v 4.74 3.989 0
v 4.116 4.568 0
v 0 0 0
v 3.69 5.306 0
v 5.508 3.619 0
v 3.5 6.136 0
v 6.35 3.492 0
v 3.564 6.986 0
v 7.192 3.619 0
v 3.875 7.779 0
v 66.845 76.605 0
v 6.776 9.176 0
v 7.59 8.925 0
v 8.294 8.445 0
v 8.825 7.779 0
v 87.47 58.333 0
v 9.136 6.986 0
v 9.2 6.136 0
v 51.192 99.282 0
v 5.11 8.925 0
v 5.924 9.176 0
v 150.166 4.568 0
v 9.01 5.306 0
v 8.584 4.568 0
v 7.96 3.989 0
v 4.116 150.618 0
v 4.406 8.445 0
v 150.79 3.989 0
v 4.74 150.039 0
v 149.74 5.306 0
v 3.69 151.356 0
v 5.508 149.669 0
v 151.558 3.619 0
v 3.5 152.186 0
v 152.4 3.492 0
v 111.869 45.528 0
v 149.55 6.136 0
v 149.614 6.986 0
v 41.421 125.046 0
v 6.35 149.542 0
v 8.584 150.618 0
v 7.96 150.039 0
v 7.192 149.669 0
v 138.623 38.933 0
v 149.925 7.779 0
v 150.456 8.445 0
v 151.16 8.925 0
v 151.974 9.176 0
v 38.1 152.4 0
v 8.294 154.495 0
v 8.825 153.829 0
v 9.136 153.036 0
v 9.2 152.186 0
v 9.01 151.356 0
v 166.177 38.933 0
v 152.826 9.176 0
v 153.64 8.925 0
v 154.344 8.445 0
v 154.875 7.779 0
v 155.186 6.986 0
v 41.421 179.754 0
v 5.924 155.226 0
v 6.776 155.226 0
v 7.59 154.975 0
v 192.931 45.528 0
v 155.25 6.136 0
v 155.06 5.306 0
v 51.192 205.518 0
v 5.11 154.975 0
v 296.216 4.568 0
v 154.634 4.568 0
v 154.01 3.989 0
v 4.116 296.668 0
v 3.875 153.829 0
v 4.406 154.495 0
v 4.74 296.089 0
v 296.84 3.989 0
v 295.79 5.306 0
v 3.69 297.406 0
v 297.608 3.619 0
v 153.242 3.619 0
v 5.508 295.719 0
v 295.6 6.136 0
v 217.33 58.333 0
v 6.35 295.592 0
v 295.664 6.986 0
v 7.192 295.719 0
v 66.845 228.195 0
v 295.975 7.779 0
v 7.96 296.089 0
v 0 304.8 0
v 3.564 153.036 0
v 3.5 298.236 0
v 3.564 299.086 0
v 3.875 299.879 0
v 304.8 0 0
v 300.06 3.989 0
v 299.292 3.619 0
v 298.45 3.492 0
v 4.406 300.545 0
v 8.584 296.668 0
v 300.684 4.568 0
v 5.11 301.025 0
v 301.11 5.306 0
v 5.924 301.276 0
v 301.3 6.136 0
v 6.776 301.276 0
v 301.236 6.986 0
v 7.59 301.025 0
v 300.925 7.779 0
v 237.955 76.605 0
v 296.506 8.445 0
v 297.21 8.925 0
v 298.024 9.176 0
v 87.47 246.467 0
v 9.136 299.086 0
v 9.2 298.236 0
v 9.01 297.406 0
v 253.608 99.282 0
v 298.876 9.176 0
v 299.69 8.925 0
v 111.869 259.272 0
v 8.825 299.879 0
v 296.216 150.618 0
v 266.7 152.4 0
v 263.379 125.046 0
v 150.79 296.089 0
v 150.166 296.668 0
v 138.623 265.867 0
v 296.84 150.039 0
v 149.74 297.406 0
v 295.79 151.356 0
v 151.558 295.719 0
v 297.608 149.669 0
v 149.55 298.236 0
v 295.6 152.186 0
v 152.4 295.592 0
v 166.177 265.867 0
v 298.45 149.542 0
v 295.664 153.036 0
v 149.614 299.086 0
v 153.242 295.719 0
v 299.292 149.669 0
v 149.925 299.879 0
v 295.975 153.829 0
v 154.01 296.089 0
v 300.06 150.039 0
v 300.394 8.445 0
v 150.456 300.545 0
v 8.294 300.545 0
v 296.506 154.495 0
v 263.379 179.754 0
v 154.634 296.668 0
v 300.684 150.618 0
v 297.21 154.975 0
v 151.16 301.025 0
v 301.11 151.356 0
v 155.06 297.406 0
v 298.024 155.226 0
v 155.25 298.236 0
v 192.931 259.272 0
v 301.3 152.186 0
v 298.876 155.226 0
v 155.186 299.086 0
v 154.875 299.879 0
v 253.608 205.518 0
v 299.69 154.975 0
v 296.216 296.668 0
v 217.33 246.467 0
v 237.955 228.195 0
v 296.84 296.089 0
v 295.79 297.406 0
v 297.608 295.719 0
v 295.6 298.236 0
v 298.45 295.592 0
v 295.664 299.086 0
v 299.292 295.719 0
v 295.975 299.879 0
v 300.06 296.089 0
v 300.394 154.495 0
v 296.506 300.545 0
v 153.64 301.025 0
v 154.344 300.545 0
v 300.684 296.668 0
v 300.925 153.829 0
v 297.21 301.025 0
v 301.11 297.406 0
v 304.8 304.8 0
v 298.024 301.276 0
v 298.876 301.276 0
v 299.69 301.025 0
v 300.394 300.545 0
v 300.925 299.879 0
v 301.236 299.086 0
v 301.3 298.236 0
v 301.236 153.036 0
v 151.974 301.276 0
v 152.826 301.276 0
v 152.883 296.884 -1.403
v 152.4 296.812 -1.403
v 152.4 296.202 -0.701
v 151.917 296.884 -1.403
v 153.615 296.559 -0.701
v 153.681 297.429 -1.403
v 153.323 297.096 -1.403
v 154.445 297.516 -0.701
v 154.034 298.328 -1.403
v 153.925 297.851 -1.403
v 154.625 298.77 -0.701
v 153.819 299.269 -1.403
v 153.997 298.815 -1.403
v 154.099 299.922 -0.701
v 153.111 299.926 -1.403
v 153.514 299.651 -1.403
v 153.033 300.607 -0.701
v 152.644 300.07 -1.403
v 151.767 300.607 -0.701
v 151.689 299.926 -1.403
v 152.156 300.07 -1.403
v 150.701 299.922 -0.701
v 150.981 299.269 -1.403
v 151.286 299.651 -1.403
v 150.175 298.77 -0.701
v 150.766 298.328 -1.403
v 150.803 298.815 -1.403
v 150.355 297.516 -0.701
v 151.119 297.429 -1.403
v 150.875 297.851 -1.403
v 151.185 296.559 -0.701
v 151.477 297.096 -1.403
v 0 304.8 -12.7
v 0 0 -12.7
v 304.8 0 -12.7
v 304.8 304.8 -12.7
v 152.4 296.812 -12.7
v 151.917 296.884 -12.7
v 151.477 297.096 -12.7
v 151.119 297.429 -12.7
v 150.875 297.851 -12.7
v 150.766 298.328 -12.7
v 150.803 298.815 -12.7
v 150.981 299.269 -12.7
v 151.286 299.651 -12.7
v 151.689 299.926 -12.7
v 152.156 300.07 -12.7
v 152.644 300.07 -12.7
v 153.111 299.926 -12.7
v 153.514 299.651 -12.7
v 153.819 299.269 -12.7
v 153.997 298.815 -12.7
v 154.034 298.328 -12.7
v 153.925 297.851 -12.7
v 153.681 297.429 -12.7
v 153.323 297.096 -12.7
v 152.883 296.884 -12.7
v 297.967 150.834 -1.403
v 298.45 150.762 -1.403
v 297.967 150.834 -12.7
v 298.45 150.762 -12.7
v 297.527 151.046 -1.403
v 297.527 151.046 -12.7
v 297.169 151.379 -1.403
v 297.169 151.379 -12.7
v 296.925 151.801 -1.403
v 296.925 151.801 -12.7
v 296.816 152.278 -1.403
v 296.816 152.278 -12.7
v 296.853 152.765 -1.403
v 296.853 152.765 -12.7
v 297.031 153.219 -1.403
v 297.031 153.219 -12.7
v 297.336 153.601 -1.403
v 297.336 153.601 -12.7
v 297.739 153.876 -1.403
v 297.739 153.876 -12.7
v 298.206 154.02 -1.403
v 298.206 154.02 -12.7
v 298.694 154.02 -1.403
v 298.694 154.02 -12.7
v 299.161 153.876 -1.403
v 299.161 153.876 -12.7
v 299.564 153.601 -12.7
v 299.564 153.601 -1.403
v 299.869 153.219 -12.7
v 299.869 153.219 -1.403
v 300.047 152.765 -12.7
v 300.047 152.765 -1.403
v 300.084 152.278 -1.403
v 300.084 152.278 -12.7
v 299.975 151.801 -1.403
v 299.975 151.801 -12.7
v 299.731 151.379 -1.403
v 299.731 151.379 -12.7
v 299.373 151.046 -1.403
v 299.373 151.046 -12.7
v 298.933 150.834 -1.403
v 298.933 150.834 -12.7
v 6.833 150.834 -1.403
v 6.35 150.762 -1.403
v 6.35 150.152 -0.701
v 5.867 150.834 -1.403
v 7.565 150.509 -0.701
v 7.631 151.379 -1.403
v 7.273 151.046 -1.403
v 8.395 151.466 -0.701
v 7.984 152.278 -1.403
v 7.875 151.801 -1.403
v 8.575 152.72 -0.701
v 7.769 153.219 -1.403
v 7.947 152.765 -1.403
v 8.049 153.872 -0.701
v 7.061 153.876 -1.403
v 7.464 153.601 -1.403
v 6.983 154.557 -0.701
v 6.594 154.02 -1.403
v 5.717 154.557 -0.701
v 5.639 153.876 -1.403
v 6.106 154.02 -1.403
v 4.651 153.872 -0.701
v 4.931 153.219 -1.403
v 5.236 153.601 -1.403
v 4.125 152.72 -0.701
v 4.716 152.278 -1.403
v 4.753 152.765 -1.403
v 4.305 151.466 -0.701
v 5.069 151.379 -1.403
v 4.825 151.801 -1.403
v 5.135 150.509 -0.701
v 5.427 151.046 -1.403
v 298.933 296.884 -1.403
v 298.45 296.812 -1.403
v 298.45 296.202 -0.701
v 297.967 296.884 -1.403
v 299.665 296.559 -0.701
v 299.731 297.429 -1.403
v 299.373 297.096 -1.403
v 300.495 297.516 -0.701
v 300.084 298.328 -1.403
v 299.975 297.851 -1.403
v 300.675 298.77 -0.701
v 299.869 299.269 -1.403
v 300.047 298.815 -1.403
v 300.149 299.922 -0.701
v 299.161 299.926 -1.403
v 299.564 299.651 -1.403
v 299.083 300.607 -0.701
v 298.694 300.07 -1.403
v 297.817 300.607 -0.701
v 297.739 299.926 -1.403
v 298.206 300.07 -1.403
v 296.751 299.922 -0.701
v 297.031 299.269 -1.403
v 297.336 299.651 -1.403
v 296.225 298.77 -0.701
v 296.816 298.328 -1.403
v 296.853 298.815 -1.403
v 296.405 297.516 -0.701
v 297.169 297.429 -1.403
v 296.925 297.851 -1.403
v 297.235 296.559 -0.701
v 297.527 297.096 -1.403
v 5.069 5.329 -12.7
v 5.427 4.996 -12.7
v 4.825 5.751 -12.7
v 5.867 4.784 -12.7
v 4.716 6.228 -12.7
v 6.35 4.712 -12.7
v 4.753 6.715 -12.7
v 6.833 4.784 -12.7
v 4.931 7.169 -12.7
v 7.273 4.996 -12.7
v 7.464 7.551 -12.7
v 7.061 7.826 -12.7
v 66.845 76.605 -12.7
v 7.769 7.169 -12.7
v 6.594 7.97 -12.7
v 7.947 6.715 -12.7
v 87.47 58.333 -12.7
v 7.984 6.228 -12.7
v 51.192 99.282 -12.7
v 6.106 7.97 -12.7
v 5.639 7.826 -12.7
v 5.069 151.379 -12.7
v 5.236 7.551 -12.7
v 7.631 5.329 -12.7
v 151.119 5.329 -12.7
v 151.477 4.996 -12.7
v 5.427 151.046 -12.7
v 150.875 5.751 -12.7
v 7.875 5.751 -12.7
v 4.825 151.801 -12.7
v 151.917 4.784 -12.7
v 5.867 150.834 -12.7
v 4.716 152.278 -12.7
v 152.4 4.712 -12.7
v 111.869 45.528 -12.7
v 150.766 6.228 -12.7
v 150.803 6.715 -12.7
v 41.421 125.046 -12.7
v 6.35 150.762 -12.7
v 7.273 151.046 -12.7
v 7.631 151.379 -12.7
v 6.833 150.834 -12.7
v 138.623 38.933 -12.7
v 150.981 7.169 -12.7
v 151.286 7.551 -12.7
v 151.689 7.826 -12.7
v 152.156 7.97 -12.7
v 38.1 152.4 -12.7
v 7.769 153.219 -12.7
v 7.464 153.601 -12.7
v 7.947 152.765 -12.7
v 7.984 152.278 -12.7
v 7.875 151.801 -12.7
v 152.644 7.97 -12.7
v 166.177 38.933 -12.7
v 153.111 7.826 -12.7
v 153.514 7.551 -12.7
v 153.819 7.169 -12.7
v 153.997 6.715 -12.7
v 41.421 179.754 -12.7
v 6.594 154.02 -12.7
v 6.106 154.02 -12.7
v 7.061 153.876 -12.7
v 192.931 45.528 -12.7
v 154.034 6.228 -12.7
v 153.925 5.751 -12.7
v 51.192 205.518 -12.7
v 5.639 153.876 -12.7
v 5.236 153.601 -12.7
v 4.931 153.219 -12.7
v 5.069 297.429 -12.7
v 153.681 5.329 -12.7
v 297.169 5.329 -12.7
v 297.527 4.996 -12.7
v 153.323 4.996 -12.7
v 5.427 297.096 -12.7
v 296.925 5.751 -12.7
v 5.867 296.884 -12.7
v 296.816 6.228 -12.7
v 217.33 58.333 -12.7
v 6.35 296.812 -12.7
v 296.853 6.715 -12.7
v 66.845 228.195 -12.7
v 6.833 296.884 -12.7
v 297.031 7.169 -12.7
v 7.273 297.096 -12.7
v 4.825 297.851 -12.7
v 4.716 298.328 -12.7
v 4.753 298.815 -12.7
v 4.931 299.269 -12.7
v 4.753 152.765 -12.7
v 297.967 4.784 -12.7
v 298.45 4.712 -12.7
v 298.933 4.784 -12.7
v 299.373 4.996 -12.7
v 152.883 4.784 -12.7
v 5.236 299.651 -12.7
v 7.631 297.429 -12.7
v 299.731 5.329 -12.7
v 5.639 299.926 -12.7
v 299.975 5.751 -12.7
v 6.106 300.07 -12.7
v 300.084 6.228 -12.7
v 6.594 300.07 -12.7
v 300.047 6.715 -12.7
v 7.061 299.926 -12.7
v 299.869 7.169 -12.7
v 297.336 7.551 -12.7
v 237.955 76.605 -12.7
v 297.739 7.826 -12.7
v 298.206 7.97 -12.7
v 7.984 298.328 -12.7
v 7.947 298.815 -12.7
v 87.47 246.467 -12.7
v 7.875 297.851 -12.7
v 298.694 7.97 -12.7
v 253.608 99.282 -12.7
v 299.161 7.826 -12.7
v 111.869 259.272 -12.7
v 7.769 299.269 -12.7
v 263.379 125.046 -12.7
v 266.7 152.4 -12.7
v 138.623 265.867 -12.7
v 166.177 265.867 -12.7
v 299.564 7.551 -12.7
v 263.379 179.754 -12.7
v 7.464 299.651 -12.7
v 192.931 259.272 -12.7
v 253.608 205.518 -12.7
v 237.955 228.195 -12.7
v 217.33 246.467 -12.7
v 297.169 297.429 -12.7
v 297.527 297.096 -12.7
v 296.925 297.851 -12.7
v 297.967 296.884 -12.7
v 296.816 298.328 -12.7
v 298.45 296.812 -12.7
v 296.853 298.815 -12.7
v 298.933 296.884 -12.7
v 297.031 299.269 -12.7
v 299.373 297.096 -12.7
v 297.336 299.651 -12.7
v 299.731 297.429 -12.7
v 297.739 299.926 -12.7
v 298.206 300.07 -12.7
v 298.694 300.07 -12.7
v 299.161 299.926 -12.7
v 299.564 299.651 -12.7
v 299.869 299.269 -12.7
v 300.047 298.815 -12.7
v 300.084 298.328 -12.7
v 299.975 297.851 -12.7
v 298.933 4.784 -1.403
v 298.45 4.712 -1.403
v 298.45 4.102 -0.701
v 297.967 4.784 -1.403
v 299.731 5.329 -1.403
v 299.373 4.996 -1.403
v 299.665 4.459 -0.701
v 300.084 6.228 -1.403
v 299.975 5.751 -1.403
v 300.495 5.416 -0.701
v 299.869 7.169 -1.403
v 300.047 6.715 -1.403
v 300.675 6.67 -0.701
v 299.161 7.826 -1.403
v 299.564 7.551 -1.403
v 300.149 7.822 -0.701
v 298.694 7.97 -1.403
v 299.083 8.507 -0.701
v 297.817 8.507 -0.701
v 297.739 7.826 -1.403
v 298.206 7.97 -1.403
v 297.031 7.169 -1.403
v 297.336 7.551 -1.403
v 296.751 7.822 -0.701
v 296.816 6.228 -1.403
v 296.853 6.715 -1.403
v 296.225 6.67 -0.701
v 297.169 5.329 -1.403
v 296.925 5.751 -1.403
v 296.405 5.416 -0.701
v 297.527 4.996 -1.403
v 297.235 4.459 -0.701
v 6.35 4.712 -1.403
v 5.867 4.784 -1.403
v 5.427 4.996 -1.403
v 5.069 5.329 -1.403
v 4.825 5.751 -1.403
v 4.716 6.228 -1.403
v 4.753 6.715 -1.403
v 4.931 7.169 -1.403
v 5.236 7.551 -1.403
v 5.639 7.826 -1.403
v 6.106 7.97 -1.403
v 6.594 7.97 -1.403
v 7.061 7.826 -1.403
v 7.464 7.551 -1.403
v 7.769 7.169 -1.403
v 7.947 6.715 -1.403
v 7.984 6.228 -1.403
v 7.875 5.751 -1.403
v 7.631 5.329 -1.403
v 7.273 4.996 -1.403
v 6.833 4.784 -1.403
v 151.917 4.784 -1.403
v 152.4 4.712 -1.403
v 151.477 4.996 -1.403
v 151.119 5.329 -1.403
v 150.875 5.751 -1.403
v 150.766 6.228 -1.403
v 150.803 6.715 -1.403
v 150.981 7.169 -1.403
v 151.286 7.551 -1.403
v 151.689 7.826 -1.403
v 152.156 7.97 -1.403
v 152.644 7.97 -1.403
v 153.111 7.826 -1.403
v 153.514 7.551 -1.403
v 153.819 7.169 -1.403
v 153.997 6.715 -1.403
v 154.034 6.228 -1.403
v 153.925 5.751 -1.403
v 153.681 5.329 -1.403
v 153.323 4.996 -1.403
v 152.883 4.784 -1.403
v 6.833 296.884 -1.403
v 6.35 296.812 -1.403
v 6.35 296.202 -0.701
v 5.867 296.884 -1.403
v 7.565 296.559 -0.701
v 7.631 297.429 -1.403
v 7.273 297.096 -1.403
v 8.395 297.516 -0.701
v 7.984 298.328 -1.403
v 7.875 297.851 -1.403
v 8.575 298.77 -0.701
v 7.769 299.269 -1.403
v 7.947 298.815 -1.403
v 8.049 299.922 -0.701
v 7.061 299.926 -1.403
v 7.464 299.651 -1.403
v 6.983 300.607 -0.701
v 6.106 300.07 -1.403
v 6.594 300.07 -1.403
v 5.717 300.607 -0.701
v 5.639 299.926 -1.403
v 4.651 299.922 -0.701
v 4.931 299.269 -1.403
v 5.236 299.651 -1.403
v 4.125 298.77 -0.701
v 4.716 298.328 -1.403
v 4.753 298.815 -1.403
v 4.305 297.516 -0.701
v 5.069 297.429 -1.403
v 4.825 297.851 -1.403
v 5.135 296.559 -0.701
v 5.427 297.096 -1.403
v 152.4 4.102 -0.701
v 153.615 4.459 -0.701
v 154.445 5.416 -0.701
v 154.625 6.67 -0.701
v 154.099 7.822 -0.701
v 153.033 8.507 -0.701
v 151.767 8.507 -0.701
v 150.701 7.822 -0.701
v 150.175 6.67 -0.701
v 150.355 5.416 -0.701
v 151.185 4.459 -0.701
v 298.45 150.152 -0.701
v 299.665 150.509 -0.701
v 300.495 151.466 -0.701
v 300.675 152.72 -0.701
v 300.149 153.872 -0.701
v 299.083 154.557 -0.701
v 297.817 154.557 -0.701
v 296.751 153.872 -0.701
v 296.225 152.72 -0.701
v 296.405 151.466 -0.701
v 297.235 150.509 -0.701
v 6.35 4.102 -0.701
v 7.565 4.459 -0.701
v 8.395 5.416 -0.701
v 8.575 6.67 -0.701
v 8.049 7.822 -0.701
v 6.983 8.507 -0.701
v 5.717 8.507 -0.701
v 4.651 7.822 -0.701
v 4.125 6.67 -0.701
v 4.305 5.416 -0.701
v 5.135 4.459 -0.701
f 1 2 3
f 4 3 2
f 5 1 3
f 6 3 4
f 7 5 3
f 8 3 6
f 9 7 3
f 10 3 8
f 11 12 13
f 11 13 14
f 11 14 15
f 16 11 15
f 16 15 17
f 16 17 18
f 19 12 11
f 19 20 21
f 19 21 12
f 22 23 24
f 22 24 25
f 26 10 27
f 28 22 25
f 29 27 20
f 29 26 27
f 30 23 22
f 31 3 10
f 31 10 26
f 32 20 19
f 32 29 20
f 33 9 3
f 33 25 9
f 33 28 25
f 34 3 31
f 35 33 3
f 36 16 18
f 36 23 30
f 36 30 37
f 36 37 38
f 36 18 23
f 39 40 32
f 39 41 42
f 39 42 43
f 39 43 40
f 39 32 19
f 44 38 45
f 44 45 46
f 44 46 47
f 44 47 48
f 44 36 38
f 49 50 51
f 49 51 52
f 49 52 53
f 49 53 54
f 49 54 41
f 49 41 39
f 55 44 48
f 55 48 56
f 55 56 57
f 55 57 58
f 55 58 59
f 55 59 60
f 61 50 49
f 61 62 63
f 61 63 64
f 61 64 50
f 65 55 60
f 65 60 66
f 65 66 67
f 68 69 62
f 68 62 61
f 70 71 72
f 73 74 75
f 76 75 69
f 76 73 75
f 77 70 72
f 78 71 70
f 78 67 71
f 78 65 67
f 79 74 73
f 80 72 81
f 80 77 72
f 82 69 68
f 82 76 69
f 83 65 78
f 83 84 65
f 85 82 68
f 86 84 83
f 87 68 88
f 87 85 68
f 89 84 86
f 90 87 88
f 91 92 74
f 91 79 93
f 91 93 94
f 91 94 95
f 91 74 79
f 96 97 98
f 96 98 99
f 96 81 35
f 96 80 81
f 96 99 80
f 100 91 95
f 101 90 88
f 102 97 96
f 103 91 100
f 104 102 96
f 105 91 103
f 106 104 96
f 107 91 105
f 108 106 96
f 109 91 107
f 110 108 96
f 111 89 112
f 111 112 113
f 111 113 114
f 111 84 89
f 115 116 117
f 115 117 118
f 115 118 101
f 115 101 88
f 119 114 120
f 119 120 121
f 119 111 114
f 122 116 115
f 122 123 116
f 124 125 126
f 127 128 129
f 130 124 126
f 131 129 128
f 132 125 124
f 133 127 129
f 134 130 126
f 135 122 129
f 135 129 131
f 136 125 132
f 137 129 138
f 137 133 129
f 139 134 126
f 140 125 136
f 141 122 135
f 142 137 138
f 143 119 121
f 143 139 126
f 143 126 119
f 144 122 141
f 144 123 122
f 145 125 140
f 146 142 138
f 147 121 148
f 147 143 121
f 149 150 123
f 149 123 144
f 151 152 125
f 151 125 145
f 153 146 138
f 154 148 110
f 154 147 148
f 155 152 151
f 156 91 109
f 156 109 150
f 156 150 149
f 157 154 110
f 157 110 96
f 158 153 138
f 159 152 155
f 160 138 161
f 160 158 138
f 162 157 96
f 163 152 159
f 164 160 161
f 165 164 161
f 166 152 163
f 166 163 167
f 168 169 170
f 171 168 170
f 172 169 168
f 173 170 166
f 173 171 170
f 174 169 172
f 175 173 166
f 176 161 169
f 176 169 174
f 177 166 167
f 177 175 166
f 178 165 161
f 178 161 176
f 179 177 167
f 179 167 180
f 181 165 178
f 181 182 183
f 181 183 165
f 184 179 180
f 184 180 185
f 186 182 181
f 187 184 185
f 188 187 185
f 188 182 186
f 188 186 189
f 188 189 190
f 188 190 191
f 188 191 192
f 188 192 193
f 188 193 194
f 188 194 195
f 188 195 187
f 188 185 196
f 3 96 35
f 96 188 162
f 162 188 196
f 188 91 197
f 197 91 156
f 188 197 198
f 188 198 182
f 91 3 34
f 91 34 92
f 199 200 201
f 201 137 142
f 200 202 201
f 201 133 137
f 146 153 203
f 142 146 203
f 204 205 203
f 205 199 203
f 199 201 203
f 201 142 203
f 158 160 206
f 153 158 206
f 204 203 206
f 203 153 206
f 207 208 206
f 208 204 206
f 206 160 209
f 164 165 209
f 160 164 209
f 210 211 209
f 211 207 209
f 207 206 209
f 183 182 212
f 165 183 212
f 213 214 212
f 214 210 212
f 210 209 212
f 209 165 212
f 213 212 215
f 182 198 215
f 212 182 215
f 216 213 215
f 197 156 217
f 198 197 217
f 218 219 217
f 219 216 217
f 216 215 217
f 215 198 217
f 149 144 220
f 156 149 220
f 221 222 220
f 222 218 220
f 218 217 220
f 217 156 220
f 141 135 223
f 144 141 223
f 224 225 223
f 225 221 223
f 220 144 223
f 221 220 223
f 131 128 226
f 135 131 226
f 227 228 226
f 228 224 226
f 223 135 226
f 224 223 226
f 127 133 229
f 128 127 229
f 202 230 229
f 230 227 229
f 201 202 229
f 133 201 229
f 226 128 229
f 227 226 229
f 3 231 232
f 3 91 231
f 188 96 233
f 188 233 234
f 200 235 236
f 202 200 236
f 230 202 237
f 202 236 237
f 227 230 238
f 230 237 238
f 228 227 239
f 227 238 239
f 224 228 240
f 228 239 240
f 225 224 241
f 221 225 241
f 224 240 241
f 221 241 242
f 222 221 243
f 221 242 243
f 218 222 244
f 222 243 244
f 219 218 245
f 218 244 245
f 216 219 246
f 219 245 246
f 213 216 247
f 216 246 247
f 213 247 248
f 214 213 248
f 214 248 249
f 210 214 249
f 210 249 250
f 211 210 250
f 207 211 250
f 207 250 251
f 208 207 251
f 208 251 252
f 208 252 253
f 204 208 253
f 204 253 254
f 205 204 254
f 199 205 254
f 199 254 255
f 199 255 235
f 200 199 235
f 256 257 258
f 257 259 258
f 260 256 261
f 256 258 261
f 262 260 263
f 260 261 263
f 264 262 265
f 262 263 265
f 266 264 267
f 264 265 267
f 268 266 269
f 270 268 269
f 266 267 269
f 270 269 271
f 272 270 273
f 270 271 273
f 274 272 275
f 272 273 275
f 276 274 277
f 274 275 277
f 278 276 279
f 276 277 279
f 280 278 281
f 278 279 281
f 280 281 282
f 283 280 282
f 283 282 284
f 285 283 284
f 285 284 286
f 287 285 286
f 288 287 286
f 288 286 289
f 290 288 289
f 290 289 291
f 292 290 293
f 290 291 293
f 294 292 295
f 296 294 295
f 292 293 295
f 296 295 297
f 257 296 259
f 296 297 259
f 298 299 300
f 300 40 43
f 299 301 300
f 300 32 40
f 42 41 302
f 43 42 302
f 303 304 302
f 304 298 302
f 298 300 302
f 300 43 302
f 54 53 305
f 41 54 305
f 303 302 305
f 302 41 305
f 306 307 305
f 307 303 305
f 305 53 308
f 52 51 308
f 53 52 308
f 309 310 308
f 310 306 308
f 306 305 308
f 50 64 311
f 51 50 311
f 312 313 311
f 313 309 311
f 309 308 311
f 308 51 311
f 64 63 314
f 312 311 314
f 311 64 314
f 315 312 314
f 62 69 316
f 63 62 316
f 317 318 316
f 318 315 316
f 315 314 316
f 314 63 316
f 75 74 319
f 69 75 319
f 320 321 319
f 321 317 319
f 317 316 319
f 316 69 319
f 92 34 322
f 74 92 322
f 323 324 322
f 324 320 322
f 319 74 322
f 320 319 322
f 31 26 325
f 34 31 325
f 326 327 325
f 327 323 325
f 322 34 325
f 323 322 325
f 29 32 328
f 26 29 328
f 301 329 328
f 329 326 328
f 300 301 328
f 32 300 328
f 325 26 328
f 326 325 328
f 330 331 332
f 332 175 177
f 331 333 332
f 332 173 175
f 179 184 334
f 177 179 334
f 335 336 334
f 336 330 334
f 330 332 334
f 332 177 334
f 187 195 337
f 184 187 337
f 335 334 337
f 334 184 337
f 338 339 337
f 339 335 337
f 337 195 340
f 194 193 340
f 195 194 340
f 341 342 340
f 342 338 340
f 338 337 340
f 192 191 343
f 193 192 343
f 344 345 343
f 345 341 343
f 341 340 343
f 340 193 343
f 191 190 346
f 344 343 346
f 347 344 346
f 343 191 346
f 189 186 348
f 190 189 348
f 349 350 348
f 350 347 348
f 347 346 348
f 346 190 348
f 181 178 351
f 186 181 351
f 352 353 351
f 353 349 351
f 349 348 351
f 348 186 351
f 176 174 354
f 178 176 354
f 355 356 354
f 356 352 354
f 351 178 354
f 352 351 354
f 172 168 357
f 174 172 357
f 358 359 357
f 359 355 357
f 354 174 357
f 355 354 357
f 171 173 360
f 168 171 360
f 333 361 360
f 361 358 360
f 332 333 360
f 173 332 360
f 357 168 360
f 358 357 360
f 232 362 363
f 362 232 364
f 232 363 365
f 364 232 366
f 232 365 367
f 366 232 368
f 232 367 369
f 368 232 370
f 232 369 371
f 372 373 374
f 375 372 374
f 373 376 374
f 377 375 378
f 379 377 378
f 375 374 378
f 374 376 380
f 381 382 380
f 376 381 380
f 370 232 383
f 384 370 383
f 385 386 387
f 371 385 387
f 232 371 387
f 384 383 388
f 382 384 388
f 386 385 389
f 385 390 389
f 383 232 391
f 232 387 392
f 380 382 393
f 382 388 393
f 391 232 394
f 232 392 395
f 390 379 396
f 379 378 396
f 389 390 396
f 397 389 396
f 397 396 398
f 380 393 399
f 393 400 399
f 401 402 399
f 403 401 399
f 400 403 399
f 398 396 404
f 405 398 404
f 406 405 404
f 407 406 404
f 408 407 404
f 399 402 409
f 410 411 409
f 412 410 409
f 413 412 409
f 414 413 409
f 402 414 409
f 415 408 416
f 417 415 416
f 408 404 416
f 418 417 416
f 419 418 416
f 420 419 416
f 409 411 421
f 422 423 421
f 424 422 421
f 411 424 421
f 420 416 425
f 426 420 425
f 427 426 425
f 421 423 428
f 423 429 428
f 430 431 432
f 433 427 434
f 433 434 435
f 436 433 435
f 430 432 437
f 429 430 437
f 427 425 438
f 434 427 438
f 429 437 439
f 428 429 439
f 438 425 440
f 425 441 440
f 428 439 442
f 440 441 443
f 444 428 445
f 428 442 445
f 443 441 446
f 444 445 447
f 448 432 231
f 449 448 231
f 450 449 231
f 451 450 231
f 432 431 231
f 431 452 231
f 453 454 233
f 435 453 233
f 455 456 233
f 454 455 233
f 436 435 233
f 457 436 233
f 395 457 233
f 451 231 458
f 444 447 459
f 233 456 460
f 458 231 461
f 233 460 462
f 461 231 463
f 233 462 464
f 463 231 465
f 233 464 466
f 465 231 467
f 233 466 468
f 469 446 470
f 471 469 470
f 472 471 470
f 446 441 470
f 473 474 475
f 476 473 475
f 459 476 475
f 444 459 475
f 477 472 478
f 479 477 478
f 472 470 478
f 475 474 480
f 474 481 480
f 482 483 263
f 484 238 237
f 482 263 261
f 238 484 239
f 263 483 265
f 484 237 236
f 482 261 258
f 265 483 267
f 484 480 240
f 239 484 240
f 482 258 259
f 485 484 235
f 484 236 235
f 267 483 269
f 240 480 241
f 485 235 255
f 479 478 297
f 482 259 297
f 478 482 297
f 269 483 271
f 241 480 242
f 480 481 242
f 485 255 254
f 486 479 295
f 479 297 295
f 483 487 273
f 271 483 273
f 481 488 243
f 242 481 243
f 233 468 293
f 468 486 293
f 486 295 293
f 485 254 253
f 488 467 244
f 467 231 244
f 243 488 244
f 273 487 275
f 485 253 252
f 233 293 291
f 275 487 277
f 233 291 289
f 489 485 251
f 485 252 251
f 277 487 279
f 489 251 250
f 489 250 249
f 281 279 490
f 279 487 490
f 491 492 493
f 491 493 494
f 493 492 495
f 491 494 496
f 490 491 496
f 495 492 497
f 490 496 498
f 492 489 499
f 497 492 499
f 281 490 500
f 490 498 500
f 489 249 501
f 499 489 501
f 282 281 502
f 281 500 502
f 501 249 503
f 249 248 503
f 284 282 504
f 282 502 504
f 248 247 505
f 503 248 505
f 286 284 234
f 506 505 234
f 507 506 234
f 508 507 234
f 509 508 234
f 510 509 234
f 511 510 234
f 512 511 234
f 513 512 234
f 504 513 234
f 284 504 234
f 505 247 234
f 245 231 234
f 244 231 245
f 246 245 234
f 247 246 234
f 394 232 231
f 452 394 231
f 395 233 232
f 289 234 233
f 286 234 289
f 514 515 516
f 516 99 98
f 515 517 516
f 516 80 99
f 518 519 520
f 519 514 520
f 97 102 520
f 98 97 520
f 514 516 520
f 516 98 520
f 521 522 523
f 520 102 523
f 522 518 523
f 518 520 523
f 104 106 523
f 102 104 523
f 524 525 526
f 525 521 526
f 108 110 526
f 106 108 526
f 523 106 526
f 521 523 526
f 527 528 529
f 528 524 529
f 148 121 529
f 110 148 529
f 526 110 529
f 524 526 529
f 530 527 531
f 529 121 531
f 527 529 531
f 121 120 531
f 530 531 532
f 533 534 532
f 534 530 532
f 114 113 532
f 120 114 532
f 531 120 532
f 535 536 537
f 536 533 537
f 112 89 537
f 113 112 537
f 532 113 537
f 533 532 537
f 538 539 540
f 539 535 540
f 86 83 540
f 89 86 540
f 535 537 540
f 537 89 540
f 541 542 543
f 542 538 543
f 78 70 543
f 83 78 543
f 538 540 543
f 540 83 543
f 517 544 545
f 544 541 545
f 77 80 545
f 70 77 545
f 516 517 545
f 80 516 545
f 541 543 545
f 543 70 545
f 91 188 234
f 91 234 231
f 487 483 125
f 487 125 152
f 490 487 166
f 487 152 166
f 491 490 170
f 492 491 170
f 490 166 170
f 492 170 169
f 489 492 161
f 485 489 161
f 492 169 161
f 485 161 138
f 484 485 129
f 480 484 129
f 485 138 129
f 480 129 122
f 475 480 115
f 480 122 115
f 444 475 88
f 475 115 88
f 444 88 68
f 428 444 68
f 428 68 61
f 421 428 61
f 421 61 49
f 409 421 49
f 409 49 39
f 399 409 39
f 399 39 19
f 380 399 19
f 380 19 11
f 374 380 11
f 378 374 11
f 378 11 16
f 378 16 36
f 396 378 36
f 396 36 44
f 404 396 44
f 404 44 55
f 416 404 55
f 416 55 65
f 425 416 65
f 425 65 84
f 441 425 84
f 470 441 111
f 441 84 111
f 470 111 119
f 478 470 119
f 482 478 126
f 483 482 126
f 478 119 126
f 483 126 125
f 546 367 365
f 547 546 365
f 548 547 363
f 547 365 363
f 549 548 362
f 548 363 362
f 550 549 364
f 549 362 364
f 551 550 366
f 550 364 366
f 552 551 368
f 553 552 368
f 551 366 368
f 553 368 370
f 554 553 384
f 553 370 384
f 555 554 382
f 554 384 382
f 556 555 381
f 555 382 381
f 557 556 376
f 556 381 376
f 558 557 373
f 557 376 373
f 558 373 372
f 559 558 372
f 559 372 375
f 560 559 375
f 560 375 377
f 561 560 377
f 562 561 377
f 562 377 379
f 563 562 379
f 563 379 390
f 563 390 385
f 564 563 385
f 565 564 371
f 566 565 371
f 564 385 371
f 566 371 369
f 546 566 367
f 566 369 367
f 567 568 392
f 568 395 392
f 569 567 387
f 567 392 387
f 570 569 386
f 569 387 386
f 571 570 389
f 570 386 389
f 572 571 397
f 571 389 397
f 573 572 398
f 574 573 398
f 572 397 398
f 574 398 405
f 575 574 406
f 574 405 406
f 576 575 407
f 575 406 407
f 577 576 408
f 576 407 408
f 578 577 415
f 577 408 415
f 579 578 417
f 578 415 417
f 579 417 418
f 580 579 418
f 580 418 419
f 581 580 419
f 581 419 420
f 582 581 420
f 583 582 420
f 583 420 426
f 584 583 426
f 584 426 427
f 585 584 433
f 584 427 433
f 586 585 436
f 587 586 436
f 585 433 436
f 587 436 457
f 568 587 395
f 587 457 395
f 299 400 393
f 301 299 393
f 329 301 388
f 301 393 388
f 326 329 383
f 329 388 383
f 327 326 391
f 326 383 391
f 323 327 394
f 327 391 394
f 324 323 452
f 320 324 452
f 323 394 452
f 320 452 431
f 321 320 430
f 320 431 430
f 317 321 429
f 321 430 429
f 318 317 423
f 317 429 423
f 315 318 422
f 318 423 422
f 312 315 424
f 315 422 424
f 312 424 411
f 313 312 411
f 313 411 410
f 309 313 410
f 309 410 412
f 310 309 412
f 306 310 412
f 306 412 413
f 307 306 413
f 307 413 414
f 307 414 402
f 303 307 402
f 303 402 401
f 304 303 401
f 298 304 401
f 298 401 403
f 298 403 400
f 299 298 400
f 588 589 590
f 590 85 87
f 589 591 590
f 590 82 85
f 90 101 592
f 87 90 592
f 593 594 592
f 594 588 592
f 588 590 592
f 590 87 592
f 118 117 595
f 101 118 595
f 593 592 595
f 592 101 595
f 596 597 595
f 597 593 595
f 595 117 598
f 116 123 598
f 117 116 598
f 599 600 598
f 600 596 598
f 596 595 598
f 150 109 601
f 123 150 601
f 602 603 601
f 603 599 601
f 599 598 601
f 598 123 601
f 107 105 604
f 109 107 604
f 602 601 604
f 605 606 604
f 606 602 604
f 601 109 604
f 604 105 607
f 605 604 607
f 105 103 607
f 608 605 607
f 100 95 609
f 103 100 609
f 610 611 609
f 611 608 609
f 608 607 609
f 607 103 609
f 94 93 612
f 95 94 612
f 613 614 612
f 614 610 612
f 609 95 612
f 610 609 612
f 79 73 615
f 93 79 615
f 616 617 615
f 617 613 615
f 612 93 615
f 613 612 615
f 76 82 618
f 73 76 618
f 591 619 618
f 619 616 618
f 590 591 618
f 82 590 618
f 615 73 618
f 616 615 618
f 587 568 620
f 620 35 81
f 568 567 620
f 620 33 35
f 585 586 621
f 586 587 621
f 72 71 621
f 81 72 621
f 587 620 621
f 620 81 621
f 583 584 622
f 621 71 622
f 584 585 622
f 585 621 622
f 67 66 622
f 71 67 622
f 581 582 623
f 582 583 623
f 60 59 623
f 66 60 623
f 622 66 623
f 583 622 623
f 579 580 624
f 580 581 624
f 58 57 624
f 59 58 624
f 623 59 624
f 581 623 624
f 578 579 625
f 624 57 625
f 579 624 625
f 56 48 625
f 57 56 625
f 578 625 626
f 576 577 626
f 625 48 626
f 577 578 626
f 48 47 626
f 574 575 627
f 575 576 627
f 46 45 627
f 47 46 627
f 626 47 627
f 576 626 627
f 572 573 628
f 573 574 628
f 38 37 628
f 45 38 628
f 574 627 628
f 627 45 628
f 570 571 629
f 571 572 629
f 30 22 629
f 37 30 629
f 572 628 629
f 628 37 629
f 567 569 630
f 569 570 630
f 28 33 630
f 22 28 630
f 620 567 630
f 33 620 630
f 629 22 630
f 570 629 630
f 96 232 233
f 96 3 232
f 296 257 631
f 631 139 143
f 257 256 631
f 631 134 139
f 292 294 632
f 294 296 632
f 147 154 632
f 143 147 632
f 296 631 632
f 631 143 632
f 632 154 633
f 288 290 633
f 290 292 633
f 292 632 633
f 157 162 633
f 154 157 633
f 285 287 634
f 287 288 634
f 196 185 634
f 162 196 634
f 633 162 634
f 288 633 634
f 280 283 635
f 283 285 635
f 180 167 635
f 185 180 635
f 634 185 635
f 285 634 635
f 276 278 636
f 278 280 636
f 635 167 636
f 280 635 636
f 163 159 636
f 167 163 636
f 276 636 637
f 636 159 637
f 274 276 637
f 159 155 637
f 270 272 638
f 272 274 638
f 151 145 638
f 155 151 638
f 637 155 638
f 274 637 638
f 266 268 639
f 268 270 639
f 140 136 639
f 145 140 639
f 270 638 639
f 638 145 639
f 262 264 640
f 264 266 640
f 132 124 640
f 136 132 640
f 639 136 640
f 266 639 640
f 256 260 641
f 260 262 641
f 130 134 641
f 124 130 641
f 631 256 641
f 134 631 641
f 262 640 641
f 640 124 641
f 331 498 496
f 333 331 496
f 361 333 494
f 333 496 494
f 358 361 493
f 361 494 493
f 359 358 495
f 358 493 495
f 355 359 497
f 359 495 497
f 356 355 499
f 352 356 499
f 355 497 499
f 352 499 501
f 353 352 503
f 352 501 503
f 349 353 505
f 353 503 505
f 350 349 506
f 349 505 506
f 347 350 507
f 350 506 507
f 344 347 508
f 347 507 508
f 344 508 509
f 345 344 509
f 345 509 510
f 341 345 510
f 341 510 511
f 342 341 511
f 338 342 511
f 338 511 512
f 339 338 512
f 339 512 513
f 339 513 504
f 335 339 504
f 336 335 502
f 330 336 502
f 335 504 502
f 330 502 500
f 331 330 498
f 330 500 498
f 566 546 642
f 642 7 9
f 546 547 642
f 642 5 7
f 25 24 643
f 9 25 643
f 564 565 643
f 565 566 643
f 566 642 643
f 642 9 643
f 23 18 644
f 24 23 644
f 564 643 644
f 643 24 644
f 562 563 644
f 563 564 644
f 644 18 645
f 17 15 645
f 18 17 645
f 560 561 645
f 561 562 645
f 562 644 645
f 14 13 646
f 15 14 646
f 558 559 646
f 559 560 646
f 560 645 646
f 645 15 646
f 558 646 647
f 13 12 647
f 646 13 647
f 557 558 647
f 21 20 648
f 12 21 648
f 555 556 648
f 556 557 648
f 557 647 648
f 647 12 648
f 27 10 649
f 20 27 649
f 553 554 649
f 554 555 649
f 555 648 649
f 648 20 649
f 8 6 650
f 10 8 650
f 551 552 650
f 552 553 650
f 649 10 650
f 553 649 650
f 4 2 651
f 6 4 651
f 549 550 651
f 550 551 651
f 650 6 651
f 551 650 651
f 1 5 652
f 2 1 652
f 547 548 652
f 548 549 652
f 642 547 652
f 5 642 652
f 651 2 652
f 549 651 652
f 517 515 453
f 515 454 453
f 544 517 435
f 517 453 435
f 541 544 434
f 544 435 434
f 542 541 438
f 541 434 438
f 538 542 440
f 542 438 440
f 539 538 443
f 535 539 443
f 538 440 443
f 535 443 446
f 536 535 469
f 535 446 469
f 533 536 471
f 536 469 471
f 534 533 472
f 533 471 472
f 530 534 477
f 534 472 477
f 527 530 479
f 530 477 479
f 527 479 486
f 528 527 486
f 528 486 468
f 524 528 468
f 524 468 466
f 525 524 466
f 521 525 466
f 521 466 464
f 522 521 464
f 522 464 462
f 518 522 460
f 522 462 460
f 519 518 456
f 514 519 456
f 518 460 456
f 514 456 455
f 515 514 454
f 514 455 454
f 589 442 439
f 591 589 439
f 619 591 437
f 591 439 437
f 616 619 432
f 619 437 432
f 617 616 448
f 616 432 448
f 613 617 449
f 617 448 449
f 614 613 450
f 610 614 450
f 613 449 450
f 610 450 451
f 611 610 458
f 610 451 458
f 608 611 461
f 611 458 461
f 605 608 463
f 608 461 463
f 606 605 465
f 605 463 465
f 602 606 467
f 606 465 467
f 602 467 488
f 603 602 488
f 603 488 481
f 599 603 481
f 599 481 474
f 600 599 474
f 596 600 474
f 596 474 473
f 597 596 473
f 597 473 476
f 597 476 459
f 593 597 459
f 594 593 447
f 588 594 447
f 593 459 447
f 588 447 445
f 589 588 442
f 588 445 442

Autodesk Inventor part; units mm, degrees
ref_plane "YZ Plane" through (0, 0, 0) normal (1, 0, 0) x (0, 1, 0)
ref_plane "XZ Plane" through (0, 0, 0) normal (0, 1, 0) x (-1, 0, 0)
ref_plane "XY Plane" through (0, 0, 0) normal (0, 0, 1) x (1, 0, 0)
sketch "Sketch1" plane through (0, 0, 0) normal (0, 0, 1) x (1, 0, 0)
  line L0 (0, 0) -> (304.8, 0)
  line L1 (304.8, 0) -> (304.8, 304.8)
  line L2 (304.8, 304.8) -> (0, 304.8)
  line L3 (0, 304.8) -> (0, 0)
  circle A0 centre (152.4, 152.4) radius 114.3
  circle A1 centre (6.35, 298.45) radius 0.9922
  circle A2 centre (298.45, 298.45) radius 0.9922
  circle A3 centre (298.45, 6.35) radius 0.9922
  circle A4 centre (6.35, 6.35) radius 0.9922
  circle A5 centre (6.35, 152.4) radius 0.9922
  circle A6 centre (298.45, 152.4) radius 0.9922
  circle A7 centre (152.4, 298.45) radius 0.9922
  circle A8 centre (152.4, 6.35) radius 0.9922
  point P0 (304.8, 152.4)
  point P1 (152.4, 304.8)
  dimension "d0" = 304.8
  dimension "d1" = 228.6
  dimension "d6" = 1.9844
  dimension "d7" = 6.35
  dimension "d8" = 6.35
  dimension "d10" = 6.35
  dimension "d11" = 6.35
extrude "Extrusion1" add sketch "Sketch1" against normal blind 12.7 contours L3 L2 L1 L0 | A1 | A2 | A3 | A4 | A5 | A6 | A7 | A8
hole "Hole1" at (6.35, 298.45, 0) at (298.45, 298.45, 0) at (298.45, 6.35, 0) at (6.35, 6.35, 0) at (152.4, 298.45, 0) at (152.4, 6.35, 0) at (298.45, 152.4, 0) at (6.35, 152.4, 0) direction (0, 0, -1) diameter 3.2766 end through all countersink diameter 5.715 countersink angle 82 clearance for "Flat Head Machine Screw (82)" size "#4" standard "Ansi Unified Screw Threads"
equation "\"d10\" = d7"
equation "\"d11\" = d8"
properties material "MDF Medium Density Fiberboard"
